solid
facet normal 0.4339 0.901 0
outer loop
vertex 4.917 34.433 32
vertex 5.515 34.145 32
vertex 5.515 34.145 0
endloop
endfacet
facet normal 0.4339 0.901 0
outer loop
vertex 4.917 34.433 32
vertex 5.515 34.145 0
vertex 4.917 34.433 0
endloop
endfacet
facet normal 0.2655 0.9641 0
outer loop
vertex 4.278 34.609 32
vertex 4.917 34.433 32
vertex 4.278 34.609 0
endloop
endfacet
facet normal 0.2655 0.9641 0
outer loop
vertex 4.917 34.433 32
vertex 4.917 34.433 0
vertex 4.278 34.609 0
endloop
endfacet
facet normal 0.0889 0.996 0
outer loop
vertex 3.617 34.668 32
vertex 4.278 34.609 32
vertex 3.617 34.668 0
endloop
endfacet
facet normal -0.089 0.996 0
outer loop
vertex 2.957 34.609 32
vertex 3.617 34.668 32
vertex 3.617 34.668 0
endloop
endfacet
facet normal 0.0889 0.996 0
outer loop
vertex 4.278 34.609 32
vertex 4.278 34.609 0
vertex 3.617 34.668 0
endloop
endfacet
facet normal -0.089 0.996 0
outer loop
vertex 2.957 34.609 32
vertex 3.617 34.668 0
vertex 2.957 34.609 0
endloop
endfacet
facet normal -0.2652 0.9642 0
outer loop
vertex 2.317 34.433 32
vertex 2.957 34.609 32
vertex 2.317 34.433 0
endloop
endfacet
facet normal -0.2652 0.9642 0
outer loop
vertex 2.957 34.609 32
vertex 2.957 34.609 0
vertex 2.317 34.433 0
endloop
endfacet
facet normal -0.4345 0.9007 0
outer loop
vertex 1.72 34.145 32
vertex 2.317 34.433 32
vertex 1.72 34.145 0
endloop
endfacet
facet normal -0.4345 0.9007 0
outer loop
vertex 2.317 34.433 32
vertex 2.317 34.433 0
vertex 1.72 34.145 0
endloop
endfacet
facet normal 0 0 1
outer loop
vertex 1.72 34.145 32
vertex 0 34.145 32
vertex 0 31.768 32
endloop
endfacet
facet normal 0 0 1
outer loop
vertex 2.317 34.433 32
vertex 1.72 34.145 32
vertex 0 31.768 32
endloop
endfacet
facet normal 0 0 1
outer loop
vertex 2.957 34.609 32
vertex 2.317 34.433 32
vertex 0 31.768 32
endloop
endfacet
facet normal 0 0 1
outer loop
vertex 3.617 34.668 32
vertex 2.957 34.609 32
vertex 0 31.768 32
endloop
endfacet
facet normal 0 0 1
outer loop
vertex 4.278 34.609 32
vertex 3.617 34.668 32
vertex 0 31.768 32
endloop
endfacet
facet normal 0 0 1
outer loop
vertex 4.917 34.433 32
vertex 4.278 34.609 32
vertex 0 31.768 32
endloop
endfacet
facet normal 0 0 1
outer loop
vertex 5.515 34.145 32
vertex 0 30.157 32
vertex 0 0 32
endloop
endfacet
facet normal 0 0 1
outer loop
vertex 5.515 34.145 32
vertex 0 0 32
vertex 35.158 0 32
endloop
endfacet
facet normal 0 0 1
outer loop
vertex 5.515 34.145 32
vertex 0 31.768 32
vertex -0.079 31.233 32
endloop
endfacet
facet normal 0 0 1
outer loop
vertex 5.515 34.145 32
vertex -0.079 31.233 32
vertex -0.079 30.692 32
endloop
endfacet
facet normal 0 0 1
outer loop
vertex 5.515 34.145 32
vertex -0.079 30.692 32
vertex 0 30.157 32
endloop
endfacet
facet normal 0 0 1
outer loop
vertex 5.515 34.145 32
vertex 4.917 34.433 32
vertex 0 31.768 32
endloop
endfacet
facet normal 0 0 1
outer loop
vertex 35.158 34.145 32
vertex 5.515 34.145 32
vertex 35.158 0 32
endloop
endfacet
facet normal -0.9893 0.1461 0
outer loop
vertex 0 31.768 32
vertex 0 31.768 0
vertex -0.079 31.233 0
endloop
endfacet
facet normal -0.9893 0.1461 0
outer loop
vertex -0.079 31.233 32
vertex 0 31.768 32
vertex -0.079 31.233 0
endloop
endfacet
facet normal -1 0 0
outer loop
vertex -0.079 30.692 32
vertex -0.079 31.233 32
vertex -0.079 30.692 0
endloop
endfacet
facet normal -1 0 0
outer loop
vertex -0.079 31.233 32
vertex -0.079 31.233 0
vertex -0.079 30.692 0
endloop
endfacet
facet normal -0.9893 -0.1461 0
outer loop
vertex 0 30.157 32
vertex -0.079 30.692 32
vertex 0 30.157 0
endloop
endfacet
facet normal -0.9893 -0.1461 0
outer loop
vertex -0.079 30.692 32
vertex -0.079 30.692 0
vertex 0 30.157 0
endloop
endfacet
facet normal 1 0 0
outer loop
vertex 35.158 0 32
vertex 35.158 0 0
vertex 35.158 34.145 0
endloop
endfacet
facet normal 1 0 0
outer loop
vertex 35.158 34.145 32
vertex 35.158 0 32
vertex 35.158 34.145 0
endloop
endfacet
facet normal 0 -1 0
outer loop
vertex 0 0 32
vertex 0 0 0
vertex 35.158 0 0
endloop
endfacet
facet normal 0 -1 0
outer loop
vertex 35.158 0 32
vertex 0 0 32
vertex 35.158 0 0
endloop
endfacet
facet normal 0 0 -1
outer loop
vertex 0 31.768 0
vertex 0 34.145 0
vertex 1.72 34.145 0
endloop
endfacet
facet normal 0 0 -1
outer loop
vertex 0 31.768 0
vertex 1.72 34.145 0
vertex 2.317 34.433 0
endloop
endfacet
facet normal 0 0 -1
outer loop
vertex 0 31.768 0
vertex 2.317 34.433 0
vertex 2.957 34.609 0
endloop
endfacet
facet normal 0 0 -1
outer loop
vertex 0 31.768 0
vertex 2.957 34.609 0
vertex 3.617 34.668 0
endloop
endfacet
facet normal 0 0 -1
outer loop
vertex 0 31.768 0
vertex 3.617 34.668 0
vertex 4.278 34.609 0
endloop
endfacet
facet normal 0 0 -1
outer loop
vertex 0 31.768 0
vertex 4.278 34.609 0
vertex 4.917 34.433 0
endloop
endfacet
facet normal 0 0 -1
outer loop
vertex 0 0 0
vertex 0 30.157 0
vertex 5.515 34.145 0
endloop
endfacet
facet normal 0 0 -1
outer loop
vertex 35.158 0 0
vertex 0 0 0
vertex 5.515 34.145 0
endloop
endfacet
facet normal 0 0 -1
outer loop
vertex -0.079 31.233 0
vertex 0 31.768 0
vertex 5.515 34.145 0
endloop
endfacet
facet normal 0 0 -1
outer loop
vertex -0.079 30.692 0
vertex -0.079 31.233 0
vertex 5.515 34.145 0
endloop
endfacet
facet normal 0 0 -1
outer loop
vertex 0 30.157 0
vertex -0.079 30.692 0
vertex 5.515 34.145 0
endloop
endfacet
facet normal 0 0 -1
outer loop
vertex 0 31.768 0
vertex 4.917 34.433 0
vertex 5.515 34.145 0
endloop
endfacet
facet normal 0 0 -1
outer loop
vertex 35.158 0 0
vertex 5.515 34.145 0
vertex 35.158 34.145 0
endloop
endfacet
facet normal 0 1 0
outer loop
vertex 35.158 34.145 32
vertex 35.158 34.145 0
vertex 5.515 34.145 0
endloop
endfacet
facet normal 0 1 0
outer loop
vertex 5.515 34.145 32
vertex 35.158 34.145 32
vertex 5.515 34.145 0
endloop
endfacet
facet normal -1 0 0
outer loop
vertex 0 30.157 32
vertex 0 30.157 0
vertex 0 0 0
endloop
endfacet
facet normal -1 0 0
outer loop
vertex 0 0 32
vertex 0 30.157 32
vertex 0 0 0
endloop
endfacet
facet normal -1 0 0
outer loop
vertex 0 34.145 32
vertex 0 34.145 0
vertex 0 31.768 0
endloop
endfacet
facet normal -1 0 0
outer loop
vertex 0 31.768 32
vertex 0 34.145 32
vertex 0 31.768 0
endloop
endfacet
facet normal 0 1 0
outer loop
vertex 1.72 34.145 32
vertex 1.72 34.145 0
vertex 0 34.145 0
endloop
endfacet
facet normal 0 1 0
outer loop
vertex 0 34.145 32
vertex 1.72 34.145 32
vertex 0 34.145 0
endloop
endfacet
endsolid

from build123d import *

# Parameters (mm, degrees)
F1_DEPTH = 32


with BuildPart() as f1:
    # F0 (on Top) → F1 (new body)
    with BuildSketch(Plane.XY):
        with BuildLine():
            Line((0, 30.1567251716), (0, 0))
            Line((0, 0), (35.1581014693, 0))
            Line((35.1581014693, 0), (35.1581014693, 34.1453179717))
            Line((35.1581014693, 34.1453179717), (5.5145962808, 34.1453179717))
            ThreePointArc((5.5145962808, 34.1453179717), (6.8391912962, 32.7926703645), (7.3227977475, 30.9622790664))
            ThreePointArc((7.3227977475, 30.9622790664), (4.0222975699, 27.2787928126), (0, 30.1567251716))
        make_face()
        with BuildLine():
            ThreePointArc((0, 31.7678329612), (-0.0886160044, 30.9622790664), (0, 30.1567251716))
            Line((0, 30.1567251716), (0, 31.7678329612))
        make_face()
        with BuildLine():
            Line((0, 31.7678329612), (0, 30.1567251716))
            ThreePointArc((0, 30.1567251716), (4.0222975699, 27.2787928126), (7.3227977475, 30.9622790664))
            ThreePointArc((7.3227977475, 30.9622790664), (6.8391912962, 32.7926703645), (5.5145962808, 34.1453179717))
            Line((5.5145962808, 34.1453179717), (1.7195854623, 34.1453179717))
            ThreePointArc((1.7195854623, 34.1453179717), (0.6144583967, 33.1340206882), (0, 31.7678329612))
        make_face()
        with BuildLine():
            Line((0, 34.1453179717), (0, 31.7678329612))
            ThreePointArc((0, 31.7678329612), (0.6144583967, 33.1340206882), (1.7195854623, 34.1453179717))
            Line((1.7195854623, 34.1453179717), (0, 34.1453179717))
        make_face()
        with BuildLine():
            Line((1.7195854623, 34.1453179717), (5.5145962808, 34.1453179717))
            ThreePointArc((5.5145962808, 34.1453179717), (3.6170908716, 34.6679859424), (1.7195854623, 34.1453179717))
        make_face()
    extrude(amount=F1_DEPTH)


solid = f1.part
